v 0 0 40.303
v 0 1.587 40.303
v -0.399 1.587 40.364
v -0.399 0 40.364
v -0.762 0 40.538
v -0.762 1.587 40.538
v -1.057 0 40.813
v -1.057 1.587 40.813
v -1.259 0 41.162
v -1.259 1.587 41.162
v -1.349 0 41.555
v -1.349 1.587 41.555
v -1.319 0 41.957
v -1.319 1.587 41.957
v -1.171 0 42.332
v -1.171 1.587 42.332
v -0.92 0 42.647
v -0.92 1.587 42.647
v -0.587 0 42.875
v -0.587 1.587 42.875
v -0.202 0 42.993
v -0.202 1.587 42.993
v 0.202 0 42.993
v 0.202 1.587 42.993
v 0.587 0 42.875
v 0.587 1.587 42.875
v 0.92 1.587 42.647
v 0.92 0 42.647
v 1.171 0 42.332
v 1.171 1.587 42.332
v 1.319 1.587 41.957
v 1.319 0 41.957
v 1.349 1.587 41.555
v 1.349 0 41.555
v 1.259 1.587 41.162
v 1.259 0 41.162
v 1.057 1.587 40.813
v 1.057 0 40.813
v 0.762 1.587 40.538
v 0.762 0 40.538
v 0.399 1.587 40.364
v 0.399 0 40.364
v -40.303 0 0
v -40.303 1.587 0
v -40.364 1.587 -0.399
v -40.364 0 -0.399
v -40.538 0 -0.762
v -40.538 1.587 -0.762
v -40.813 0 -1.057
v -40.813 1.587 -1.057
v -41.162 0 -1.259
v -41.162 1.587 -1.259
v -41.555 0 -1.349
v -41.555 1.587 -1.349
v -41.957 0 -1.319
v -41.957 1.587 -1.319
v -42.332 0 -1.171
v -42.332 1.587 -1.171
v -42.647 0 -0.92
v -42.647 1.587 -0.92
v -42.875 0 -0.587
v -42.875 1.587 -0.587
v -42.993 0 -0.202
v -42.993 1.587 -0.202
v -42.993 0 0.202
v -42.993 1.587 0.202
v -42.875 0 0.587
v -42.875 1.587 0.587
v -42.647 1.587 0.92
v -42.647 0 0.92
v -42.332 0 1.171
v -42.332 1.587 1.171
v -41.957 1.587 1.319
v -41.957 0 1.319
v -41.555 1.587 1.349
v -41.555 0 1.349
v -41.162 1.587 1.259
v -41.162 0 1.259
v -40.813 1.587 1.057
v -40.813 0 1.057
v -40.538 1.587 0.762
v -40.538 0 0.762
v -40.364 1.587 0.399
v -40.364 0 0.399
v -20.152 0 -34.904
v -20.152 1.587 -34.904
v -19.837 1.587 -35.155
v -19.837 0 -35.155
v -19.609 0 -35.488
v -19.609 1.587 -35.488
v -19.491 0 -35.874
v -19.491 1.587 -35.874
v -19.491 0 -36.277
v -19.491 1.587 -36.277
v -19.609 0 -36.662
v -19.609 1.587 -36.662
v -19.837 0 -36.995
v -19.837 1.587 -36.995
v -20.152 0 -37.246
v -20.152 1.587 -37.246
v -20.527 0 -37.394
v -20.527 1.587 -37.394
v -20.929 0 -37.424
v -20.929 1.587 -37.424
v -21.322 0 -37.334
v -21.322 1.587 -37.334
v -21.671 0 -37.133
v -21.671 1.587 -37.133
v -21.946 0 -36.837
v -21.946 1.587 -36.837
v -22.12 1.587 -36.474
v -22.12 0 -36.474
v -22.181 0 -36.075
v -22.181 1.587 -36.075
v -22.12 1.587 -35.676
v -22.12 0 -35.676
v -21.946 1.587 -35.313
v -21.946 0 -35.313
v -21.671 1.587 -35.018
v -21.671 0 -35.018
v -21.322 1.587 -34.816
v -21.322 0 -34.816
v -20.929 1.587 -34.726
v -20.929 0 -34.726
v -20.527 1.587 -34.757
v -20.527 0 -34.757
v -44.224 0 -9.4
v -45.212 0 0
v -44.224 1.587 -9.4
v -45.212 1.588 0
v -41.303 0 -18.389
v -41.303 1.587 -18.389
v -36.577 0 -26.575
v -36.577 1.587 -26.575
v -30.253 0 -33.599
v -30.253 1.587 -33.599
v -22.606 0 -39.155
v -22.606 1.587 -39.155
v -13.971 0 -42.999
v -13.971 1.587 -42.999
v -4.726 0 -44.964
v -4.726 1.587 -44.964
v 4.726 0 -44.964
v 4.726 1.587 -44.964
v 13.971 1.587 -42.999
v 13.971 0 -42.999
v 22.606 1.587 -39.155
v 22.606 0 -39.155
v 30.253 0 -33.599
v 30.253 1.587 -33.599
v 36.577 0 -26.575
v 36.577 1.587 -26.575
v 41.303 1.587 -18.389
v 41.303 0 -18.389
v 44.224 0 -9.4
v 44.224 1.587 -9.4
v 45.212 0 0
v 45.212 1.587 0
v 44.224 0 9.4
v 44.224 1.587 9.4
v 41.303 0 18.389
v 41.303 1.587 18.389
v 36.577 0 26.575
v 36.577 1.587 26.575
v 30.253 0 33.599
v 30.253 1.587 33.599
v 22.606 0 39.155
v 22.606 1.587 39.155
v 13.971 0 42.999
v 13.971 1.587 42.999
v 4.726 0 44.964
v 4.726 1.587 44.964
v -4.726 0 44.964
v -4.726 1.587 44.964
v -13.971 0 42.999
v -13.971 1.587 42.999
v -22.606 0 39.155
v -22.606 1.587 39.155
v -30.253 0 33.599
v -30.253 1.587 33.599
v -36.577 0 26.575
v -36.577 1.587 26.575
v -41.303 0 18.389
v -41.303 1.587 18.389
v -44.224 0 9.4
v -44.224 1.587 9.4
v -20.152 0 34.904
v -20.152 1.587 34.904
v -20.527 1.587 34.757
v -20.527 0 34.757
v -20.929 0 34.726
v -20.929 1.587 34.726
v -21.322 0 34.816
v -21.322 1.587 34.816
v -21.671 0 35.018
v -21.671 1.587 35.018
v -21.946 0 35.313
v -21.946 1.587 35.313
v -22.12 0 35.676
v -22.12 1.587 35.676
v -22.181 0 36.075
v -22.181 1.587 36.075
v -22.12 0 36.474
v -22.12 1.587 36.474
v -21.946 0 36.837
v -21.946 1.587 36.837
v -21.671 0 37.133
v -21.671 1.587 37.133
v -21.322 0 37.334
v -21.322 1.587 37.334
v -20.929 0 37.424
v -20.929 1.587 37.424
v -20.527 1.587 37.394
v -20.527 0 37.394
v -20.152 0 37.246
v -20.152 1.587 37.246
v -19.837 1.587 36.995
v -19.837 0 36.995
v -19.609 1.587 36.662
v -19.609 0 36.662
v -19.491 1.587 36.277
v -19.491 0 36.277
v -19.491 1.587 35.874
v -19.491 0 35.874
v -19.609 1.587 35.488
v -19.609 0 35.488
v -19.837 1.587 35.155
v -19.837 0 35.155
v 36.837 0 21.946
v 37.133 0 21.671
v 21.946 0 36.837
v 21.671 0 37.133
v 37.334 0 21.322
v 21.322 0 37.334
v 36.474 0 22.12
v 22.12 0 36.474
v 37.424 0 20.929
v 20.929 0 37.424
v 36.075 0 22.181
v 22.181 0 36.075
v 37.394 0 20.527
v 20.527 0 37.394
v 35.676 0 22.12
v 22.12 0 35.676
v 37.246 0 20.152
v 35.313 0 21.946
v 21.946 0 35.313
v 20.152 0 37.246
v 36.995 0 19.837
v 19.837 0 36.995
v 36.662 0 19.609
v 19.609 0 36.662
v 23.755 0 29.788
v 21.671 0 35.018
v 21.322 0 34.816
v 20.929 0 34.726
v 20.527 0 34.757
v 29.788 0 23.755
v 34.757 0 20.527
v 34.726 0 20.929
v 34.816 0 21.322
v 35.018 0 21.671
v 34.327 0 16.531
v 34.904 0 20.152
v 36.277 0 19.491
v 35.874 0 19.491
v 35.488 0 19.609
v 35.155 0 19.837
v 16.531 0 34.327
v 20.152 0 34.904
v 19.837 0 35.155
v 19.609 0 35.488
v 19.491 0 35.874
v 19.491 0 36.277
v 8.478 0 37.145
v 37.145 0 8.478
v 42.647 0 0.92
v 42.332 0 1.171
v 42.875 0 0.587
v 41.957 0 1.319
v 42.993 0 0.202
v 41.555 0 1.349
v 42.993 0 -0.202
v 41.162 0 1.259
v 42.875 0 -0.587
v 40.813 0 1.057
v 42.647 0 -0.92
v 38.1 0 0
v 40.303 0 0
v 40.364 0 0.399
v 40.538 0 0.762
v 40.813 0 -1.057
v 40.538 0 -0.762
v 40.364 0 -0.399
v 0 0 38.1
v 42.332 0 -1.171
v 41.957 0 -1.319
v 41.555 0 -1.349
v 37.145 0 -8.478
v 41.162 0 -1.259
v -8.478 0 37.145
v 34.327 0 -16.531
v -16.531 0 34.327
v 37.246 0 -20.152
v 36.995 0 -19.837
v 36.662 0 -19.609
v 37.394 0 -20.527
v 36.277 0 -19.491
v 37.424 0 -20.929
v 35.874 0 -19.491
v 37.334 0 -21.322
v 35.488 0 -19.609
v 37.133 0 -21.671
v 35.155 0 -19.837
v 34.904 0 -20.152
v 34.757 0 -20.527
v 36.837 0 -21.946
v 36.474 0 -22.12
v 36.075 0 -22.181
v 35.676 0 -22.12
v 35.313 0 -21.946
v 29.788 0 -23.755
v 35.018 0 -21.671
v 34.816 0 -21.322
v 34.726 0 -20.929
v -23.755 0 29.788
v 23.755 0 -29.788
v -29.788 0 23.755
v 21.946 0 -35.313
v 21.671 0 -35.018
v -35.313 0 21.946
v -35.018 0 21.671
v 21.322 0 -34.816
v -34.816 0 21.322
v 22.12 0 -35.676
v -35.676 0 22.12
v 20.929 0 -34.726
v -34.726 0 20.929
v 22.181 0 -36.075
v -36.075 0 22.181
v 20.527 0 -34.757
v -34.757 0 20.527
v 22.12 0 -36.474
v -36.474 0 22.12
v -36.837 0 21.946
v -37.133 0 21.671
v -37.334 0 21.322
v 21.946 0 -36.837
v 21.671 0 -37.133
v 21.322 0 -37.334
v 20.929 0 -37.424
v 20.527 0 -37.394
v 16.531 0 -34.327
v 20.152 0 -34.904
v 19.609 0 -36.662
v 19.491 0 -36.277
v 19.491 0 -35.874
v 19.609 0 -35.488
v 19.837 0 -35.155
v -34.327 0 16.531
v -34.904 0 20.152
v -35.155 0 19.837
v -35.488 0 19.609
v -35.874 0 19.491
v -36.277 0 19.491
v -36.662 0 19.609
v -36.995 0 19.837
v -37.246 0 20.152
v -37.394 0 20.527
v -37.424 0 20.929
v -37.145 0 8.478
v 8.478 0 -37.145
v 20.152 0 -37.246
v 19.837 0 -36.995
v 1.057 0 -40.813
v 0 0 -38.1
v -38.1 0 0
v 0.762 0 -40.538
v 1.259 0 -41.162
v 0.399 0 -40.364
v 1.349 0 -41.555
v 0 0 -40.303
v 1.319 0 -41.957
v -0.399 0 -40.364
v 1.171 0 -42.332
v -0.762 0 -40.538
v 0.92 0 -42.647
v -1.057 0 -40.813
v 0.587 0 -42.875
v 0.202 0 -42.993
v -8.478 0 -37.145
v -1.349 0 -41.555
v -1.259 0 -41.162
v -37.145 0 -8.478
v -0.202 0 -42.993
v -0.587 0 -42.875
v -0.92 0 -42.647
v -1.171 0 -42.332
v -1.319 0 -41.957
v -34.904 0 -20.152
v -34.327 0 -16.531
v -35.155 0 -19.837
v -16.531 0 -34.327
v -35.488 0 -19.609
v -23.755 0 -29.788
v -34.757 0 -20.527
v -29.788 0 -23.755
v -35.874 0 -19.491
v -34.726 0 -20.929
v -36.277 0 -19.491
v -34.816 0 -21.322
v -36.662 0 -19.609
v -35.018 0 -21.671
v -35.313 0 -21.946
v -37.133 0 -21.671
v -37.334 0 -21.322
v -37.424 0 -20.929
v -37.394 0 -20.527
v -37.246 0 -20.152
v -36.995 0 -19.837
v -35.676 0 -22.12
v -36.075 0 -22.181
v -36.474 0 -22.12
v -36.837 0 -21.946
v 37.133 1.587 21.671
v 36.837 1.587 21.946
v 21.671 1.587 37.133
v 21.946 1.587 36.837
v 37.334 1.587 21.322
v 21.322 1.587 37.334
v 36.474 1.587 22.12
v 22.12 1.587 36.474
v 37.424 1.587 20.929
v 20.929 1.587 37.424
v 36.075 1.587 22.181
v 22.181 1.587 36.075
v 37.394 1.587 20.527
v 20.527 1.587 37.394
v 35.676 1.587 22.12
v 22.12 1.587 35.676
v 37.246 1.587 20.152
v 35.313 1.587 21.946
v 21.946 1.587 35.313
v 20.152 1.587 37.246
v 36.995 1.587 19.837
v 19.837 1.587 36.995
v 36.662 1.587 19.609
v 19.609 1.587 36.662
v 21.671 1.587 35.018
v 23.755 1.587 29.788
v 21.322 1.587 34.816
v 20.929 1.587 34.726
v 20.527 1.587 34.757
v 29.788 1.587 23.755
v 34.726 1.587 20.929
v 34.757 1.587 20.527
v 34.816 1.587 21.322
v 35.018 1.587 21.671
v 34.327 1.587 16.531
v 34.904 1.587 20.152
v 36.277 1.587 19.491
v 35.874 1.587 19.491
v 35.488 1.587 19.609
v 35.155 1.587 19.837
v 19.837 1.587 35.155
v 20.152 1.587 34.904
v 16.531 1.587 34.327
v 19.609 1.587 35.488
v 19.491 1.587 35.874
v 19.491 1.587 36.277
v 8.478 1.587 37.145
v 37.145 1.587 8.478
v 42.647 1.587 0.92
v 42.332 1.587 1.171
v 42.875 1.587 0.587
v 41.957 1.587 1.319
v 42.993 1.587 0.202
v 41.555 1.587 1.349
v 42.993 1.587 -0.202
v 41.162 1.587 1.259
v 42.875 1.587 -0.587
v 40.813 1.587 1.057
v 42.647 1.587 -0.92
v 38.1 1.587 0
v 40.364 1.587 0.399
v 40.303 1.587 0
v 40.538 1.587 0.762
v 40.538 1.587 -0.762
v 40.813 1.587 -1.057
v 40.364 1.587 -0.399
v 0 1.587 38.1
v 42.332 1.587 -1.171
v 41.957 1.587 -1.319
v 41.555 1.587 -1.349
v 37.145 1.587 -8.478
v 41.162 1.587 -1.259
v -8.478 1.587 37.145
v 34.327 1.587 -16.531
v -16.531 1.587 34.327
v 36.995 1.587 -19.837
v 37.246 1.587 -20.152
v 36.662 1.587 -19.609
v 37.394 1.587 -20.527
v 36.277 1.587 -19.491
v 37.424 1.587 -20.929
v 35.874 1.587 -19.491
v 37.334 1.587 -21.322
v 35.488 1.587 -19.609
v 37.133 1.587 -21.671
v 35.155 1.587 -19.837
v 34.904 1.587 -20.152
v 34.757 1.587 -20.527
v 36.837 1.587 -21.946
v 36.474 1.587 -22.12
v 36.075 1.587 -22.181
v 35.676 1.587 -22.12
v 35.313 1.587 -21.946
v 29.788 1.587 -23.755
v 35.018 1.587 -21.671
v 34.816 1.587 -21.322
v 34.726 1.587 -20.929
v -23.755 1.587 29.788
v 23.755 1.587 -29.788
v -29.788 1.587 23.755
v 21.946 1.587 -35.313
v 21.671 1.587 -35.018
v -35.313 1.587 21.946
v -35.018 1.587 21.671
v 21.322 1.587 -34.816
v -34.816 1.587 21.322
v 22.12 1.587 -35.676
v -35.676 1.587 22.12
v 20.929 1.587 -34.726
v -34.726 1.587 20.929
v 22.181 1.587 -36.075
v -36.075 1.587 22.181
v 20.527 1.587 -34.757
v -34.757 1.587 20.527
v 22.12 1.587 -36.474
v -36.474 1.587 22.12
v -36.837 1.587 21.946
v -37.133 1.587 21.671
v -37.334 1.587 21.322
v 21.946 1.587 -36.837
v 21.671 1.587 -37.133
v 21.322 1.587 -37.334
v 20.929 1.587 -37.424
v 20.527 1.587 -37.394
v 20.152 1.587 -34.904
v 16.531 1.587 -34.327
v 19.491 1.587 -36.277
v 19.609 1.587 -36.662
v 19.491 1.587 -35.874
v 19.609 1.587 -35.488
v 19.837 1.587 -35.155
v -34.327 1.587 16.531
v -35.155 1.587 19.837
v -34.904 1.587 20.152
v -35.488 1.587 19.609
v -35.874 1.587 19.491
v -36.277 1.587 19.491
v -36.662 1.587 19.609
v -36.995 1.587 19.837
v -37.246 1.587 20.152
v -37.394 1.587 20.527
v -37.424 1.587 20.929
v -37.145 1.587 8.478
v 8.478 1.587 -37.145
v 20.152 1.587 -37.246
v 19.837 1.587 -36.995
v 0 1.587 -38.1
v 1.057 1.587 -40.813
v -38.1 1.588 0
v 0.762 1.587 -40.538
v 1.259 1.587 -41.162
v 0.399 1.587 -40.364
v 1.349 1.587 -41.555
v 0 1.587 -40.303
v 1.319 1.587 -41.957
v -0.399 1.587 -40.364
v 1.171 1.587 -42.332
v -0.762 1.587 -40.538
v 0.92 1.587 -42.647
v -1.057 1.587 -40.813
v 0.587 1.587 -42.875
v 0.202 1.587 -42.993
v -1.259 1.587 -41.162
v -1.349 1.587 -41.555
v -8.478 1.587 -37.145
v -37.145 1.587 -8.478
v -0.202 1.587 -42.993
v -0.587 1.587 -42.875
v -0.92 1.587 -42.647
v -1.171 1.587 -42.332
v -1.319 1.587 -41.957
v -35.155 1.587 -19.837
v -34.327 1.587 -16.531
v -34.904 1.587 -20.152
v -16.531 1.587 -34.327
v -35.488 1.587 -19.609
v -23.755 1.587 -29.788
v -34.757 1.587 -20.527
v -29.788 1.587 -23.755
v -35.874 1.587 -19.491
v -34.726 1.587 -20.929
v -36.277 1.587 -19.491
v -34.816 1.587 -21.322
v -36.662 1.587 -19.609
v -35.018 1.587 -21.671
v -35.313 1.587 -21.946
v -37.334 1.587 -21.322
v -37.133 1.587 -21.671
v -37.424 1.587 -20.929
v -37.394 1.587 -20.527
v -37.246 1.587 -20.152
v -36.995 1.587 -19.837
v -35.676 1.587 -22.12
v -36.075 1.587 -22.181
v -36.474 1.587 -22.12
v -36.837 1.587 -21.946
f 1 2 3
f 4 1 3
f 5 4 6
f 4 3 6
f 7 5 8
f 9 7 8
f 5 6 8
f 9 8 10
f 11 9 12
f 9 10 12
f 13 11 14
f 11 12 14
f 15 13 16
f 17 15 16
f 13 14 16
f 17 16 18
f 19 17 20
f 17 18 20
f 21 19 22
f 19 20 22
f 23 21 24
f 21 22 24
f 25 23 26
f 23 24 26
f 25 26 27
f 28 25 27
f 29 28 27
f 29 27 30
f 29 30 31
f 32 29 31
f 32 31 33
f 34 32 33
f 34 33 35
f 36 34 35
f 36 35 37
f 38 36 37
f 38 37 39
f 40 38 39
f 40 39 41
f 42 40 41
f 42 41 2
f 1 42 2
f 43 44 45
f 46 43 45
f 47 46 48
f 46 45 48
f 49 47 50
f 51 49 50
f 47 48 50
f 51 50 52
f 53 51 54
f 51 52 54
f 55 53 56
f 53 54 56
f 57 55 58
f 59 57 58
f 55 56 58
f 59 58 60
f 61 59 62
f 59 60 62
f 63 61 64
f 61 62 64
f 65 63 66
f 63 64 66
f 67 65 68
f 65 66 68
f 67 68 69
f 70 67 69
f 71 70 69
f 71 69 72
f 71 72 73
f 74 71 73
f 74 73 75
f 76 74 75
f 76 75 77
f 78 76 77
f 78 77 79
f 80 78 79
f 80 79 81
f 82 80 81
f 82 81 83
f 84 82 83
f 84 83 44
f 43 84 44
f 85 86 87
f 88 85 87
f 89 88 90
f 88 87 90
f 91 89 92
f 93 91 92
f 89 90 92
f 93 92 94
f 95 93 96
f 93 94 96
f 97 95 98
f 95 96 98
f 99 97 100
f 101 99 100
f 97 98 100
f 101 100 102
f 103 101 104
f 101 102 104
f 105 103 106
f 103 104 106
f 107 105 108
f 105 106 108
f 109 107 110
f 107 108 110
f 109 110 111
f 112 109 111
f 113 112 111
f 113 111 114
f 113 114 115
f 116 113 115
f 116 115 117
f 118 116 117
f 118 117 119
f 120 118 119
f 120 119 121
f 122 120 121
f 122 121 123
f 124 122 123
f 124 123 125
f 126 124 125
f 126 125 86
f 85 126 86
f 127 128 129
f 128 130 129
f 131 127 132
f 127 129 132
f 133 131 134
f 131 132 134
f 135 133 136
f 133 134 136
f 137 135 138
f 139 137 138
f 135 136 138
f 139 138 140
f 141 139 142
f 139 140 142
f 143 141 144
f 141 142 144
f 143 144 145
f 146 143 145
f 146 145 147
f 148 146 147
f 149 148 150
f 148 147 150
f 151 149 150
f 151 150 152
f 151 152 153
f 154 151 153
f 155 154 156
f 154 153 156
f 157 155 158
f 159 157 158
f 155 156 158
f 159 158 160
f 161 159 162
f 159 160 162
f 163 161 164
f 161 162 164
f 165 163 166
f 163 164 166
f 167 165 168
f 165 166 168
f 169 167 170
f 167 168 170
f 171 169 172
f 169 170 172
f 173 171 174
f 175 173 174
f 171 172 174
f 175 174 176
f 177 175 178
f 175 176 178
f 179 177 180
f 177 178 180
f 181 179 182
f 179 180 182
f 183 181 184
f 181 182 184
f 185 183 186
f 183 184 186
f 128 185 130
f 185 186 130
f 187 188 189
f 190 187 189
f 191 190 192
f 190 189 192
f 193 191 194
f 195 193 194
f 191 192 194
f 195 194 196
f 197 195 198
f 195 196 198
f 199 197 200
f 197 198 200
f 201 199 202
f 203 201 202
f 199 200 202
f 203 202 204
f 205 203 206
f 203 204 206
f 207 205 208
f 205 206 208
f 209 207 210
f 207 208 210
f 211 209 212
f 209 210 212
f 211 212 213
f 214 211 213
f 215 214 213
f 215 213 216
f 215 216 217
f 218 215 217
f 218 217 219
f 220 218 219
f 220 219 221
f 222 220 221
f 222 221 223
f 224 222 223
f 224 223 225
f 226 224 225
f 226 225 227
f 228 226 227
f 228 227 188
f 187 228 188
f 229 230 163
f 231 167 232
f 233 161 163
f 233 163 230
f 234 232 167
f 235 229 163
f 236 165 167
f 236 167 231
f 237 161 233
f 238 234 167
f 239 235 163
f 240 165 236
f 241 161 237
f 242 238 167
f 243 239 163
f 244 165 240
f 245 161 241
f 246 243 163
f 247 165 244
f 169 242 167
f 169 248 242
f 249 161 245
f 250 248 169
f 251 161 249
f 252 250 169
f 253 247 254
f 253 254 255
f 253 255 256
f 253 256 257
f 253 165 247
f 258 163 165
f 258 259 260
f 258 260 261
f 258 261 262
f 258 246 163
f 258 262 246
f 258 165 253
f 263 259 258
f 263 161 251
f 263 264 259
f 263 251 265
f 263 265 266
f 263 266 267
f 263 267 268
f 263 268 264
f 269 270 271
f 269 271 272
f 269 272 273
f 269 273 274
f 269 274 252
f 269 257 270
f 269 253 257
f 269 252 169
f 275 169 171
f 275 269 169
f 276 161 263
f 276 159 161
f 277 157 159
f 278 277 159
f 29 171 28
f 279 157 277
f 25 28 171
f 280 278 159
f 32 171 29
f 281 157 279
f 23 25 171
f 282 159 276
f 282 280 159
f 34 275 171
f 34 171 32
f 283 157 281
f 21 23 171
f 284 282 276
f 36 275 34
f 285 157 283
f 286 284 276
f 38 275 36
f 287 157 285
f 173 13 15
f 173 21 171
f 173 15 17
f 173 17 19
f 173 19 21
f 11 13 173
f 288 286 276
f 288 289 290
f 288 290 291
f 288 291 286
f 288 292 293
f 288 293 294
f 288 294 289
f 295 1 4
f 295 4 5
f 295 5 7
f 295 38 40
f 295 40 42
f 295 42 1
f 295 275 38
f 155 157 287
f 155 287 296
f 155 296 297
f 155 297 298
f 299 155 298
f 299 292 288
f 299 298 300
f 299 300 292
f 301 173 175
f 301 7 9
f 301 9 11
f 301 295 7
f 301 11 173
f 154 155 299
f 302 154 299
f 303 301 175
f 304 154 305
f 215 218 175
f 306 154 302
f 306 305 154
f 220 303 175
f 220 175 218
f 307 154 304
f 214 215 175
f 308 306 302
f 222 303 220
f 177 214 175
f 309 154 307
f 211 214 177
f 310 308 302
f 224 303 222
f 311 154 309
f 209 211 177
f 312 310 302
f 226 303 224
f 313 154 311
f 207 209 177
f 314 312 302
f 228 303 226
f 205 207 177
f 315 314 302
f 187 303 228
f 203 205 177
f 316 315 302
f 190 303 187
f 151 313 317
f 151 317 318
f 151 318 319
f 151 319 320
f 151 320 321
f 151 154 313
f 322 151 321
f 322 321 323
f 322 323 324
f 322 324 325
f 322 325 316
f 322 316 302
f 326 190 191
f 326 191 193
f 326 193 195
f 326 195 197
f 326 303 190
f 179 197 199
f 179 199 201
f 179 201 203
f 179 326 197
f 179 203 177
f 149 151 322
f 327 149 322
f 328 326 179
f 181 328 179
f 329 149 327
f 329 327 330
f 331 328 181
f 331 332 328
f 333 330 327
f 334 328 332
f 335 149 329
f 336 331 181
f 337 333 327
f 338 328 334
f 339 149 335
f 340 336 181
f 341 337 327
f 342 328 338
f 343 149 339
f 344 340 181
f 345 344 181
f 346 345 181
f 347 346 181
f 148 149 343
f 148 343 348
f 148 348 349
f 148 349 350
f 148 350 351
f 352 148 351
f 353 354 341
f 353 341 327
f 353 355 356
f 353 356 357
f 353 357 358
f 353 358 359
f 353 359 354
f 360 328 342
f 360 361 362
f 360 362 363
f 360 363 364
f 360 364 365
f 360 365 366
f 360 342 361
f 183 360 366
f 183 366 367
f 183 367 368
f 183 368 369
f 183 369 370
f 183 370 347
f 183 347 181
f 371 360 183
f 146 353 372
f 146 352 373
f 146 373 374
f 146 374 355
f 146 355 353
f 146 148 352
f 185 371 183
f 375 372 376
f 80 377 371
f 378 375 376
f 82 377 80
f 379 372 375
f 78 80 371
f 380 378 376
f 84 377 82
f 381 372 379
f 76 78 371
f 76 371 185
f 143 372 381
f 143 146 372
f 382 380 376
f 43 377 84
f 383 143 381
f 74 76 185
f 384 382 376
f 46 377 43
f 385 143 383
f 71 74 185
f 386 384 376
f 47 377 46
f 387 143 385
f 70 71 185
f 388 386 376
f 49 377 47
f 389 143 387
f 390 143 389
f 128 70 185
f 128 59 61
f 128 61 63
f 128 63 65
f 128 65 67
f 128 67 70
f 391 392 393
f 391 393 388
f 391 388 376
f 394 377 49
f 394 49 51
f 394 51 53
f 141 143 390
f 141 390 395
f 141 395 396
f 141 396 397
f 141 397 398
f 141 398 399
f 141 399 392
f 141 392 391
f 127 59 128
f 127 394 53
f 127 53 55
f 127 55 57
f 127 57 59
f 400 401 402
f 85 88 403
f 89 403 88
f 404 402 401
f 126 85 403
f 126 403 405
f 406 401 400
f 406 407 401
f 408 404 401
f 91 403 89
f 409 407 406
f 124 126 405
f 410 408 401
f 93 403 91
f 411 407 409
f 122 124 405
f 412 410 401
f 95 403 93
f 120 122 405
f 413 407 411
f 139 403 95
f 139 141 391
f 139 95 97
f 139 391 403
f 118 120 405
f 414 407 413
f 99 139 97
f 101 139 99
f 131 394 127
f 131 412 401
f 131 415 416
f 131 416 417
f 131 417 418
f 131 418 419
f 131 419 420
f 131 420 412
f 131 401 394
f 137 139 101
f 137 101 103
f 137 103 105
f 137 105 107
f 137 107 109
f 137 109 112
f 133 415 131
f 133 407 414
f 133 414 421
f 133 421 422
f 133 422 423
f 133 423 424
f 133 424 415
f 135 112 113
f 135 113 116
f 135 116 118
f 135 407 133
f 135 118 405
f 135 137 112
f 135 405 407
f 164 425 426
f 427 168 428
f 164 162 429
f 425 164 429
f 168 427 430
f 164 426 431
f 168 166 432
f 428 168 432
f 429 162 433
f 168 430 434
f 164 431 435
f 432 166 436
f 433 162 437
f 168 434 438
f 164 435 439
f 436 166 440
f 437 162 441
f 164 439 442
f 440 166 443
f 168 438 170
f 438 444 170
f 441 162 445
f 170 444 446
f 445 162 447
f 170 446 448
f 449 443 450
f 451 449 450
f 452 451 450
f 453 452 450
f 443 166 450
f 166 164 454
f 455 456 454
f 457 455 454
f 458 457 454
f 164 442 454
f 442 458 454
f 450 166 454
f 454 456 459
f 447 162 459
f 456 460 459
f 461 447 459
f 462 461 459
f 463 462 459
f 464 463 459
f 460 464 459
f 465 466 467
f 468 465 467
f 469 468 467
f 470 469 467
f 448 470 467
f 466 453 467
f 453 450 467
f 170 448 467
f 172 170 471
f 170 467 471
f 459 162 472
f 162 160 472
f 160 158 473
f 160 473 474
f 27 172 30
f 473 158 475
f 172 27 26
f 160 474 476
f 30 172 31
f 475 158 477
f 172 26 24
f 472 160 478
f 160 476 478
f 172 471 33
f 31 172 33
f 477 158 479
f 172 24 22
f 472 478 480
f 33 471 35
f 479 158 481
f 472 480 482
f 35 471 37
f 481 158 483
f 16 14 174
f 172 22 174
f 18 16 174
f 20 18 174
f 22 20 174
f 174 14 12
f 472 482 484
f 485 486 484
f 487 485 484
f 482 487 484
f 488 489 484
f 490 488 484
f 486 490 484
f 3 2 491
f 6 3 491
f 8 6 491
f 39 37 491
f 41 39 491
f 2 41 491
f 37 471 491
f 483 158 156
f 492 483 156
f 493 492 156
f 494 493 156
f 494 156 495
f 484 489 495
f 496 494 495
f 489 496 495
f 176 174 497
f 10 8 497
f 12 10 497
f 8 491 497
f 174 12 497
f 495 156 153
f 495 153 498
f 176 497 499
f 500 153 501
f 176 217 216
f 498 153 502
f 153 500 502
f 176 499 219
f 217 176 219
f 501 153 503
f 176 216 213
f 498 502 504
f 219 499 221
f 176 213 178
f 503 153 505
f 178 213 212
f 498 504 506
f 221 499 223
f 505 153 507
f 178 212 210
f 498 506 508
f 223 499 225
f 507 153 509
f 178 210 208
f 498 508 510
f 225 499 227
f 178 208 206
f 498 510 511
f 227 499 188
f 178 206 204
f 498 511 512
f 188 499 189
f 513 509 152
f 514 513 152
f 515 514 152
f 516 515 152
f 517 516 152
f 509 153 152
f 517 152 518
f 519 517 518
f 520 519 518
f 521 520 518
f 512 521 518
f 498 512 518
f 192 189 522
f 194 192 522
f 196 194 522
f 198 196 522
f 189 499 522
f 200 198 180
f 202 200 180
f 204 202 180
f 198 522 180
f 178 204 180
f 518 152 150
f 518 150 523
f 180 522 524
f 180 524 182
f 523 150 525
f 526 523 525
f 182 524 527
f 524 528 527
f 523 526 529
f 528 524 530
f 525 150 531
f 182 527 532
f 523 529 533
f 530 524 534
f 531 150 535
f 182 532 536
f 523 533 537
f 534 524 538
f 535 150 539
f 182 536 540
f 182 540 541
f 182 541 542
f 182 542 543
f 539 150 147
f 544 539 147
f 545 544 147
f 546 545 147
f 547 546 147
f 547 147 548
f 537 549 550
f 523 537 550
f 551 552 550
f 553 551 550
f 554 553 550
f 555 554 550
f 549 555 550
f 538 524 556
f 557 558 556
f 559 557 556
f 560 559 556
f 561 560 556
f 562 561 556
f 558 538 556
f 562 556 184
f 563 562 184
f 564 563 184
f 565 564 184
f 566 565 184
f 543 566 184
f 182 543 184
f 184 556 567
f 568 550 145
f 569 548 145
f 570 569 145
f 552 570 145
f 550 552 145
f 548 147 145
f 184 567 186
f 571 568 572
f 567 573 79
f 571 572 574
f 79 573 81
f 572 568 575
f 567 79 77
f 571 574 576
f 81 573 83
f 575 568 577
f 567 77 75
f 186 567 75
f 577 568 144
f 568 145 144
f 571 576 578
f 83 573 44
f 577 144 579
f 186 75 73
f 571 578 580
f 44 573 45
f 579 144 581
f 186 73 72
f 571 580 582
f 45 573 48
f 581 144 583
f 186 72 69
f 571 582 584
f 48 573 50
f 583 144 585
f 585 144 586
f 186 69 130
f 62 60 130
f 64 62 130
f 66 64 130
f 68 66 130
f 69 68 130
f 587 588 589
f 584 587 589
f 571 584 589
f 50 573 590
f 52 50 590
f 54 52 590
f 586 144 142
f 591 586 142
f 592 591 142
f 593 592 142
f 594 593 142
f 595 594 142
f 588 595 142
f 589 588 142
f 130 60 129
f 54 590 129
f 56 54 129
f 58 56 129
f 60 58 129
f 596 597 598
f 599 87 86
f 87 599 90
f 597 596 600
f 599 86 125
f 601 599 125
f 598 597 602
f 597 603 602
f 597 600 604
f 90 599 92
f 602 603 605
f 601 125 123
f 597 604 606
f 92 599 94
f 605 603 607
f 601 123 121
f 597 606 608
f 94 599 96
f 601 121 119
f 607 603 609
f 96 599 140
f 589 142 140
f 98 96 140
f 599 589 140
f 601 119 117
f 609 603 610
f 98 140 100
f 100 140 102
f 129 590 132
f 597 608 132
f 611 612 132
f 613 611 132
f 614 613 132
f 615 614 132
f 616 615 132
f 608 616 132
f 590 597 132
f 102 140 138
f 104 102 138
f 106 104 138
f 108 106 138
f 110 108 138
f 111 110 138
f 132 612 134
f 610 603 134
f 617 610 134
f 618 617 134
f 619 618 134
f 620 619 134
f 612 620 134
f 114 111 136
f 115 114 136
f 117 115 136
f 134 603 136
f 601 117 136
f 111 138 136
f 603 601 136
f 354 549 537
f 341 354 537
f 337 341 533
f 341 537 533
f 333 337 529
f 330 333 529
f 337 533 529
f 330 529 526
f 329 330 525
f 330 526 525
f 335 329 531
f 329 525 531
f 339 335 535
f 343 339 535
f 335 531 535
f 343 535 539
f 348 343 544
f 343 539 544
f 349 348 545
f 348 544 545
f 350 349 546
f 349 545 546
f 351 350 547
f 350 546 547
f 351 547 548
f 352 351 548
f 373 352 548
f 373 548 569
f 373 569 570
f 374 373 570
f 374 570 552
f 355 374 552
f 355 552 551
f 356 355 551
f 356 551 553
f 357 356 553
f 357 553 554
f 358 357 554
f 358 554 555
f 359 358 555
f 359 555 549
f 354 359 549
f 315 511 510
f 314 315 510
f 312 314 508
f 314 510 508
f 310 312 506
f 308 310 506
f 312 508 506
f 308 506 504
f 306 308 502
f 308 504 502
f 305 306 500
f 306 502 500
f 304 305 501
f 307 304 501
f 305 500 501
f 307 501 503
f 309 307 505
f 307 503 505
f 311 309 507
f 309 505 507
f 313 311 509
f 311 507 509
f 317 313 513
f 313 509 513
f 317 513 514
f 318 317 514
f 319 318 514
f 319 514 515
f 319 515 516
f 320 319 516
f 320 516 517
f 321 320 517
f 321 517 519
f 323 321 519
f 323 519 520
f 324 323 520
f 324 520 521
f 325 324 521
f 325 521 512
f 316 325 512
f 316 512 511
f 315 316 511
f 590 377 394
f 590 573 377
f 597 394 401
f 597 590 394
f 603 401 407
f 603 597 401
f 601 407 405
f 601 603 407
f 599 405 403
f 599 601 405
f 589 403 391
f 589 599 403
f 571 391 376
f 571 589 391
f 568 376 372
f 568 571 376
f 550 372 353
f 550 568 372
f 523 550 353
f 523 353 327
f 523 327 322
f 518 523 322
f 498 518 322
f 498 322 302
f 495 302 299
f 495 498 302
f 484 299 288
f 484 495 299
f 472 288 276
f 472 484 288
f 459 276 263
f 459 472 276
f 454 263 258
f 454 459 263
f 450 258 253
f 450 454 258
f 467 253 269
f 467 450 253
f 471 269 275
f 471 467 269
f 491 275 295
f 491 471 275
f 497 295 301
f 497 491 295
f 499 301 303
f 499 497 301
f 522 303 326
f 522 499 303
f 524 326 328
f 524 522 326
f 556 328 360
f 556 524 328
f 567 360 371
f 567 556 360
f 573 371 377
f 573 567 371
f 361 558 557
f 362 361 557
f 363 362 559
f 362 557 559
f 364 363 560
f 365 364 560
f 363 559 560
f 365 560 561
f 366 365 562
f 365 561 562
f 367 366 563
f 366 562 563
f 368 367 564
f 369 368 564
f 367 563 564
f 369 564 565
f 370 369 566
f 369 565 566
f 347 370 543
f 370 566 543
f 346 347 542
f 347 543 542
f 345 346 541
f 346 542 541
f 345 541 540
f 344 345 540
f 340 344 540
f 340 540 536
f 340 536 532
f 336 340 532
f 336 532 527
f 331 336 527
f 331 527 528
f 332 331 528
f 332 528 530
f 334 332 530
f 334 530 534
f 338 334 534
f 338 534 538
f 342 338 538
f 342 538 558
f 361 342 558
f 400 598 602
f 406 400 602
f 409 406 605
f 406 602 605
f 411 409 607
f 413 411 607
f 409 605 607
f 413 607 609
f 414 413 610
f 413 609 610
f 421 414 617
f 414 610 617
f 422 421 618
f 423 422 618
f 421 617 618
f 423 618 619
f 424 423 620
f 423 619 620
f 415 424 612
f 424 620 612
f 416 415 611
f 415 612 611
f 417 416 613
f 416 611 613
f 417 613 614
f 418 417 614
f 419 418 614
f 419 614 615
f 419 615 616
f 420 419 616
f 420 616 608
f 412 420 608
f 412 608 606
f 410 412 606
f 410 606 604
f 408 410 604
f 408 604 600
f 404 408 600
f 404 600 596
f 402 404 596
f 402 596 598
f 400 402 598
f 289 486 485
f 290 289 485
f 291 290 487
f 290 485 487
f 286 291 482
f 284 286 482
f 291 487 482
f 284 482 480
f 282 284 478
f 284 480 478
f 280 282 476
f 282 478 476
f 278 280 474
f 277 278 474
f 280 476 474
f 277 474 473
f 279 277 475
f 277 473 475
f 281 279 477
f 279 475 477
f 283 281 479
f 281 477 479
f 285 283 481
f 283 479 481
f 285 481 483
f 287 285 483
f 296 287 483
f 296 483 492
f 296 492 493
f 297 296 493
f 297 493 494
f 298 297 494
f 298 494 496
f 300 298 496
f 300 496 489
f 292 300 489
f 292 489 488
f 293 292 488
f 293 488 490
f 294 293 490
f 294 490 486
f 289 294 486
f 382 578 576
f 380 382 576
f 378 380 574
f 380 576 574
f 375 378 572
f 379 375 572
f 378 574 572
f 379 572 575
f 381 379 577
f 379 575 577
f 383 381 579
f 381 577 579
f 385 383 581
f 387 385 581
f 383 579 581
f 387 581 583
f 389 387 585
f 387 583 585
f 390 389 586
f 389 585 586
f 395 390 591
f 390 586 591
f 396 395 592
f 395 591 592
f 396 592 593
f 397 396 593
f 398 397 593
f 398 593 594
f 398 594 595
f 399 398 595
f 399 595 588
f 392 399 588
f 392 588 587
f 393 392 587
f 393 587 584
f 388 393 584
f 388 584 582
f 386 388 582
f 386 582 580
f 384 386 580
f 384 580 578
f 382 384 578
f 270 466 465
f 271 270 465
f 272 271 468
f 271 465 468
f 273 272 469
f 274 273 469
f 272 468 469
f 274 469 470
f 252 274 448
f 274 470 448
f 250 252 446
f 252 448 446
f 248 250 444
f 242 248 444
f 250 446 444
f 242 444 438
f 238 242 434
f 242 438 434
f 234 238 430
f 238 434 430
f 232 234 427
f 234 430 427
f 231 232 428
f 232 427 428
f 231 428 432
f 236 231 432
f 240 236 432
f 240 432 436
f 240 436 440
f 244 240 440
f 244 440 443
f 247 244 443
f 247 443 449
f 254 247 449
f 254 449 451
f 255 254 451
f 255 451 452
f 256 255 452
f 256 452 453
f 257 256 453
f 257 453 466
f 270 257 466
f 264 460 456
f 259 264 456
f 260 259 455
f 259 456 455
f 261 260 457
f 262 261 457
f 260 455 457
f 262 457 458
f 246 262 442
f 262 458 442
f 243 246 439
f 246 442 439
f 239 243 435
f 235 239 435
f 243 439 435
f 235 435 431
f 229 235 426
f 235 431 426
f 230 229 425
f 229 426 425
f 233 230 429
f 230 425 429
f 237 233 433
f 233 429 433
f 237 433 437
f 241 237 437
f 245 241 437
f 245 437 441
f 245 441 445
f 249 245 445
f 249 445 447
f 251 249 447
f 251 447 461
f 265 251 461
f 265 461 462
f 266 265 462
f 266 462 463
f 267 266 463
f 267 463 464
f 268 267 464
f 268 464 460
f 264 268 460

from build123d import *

# Parameters (mm, degrees)
SKETCH1_W                    = 7.112
SKETCH1_H                    = 1.5875
F_36_0_1065_DIAMETER_HOLE1_D = 2.7051
SCREW_PASSTHROUGHS_COUNT     = 12


with BuildPart() as part:
    # Sketch1 → Main (revolve)
    with BuildSketch(Plane.XY):
        with Locations((-41.656, 0.79375)):
            Rectangle(SKETCH1_W, SKETCH1_H)
    revolve(axis=Axis((0, 55, 0), (0, -1, 0)))

    # #36 (0.1065) Diameter Hole1 (through all)
    with Locations(Plane(origin=(0, 0, 0), x_dir=(-1, 0, 0), z_dir=(0, -1, 0))):
        with Locations((41.656, 0)):
            f_36_0_1065_diameter_hole1 = Hole(F_36_0_1065_DIAMETER_HOLE1_D / 2)

    # Screw Passthroughs: #36 (0.1065) Diameter Hole1 ×12 about axis
    screw_passthroughs_axis = Axis((0, 0, 0), (0, 1, 0))
    for i in range(1, SCREW_PASSTHROUGHS_COUNT):
        add(f_36_0_1065_diameter_hole1.rotate(screw_passthroughs_axis, i * 360 / SCREW_PASSTHROUGHS_COUNT), mode=Mode.SUBTRACT)


solid = part.part
